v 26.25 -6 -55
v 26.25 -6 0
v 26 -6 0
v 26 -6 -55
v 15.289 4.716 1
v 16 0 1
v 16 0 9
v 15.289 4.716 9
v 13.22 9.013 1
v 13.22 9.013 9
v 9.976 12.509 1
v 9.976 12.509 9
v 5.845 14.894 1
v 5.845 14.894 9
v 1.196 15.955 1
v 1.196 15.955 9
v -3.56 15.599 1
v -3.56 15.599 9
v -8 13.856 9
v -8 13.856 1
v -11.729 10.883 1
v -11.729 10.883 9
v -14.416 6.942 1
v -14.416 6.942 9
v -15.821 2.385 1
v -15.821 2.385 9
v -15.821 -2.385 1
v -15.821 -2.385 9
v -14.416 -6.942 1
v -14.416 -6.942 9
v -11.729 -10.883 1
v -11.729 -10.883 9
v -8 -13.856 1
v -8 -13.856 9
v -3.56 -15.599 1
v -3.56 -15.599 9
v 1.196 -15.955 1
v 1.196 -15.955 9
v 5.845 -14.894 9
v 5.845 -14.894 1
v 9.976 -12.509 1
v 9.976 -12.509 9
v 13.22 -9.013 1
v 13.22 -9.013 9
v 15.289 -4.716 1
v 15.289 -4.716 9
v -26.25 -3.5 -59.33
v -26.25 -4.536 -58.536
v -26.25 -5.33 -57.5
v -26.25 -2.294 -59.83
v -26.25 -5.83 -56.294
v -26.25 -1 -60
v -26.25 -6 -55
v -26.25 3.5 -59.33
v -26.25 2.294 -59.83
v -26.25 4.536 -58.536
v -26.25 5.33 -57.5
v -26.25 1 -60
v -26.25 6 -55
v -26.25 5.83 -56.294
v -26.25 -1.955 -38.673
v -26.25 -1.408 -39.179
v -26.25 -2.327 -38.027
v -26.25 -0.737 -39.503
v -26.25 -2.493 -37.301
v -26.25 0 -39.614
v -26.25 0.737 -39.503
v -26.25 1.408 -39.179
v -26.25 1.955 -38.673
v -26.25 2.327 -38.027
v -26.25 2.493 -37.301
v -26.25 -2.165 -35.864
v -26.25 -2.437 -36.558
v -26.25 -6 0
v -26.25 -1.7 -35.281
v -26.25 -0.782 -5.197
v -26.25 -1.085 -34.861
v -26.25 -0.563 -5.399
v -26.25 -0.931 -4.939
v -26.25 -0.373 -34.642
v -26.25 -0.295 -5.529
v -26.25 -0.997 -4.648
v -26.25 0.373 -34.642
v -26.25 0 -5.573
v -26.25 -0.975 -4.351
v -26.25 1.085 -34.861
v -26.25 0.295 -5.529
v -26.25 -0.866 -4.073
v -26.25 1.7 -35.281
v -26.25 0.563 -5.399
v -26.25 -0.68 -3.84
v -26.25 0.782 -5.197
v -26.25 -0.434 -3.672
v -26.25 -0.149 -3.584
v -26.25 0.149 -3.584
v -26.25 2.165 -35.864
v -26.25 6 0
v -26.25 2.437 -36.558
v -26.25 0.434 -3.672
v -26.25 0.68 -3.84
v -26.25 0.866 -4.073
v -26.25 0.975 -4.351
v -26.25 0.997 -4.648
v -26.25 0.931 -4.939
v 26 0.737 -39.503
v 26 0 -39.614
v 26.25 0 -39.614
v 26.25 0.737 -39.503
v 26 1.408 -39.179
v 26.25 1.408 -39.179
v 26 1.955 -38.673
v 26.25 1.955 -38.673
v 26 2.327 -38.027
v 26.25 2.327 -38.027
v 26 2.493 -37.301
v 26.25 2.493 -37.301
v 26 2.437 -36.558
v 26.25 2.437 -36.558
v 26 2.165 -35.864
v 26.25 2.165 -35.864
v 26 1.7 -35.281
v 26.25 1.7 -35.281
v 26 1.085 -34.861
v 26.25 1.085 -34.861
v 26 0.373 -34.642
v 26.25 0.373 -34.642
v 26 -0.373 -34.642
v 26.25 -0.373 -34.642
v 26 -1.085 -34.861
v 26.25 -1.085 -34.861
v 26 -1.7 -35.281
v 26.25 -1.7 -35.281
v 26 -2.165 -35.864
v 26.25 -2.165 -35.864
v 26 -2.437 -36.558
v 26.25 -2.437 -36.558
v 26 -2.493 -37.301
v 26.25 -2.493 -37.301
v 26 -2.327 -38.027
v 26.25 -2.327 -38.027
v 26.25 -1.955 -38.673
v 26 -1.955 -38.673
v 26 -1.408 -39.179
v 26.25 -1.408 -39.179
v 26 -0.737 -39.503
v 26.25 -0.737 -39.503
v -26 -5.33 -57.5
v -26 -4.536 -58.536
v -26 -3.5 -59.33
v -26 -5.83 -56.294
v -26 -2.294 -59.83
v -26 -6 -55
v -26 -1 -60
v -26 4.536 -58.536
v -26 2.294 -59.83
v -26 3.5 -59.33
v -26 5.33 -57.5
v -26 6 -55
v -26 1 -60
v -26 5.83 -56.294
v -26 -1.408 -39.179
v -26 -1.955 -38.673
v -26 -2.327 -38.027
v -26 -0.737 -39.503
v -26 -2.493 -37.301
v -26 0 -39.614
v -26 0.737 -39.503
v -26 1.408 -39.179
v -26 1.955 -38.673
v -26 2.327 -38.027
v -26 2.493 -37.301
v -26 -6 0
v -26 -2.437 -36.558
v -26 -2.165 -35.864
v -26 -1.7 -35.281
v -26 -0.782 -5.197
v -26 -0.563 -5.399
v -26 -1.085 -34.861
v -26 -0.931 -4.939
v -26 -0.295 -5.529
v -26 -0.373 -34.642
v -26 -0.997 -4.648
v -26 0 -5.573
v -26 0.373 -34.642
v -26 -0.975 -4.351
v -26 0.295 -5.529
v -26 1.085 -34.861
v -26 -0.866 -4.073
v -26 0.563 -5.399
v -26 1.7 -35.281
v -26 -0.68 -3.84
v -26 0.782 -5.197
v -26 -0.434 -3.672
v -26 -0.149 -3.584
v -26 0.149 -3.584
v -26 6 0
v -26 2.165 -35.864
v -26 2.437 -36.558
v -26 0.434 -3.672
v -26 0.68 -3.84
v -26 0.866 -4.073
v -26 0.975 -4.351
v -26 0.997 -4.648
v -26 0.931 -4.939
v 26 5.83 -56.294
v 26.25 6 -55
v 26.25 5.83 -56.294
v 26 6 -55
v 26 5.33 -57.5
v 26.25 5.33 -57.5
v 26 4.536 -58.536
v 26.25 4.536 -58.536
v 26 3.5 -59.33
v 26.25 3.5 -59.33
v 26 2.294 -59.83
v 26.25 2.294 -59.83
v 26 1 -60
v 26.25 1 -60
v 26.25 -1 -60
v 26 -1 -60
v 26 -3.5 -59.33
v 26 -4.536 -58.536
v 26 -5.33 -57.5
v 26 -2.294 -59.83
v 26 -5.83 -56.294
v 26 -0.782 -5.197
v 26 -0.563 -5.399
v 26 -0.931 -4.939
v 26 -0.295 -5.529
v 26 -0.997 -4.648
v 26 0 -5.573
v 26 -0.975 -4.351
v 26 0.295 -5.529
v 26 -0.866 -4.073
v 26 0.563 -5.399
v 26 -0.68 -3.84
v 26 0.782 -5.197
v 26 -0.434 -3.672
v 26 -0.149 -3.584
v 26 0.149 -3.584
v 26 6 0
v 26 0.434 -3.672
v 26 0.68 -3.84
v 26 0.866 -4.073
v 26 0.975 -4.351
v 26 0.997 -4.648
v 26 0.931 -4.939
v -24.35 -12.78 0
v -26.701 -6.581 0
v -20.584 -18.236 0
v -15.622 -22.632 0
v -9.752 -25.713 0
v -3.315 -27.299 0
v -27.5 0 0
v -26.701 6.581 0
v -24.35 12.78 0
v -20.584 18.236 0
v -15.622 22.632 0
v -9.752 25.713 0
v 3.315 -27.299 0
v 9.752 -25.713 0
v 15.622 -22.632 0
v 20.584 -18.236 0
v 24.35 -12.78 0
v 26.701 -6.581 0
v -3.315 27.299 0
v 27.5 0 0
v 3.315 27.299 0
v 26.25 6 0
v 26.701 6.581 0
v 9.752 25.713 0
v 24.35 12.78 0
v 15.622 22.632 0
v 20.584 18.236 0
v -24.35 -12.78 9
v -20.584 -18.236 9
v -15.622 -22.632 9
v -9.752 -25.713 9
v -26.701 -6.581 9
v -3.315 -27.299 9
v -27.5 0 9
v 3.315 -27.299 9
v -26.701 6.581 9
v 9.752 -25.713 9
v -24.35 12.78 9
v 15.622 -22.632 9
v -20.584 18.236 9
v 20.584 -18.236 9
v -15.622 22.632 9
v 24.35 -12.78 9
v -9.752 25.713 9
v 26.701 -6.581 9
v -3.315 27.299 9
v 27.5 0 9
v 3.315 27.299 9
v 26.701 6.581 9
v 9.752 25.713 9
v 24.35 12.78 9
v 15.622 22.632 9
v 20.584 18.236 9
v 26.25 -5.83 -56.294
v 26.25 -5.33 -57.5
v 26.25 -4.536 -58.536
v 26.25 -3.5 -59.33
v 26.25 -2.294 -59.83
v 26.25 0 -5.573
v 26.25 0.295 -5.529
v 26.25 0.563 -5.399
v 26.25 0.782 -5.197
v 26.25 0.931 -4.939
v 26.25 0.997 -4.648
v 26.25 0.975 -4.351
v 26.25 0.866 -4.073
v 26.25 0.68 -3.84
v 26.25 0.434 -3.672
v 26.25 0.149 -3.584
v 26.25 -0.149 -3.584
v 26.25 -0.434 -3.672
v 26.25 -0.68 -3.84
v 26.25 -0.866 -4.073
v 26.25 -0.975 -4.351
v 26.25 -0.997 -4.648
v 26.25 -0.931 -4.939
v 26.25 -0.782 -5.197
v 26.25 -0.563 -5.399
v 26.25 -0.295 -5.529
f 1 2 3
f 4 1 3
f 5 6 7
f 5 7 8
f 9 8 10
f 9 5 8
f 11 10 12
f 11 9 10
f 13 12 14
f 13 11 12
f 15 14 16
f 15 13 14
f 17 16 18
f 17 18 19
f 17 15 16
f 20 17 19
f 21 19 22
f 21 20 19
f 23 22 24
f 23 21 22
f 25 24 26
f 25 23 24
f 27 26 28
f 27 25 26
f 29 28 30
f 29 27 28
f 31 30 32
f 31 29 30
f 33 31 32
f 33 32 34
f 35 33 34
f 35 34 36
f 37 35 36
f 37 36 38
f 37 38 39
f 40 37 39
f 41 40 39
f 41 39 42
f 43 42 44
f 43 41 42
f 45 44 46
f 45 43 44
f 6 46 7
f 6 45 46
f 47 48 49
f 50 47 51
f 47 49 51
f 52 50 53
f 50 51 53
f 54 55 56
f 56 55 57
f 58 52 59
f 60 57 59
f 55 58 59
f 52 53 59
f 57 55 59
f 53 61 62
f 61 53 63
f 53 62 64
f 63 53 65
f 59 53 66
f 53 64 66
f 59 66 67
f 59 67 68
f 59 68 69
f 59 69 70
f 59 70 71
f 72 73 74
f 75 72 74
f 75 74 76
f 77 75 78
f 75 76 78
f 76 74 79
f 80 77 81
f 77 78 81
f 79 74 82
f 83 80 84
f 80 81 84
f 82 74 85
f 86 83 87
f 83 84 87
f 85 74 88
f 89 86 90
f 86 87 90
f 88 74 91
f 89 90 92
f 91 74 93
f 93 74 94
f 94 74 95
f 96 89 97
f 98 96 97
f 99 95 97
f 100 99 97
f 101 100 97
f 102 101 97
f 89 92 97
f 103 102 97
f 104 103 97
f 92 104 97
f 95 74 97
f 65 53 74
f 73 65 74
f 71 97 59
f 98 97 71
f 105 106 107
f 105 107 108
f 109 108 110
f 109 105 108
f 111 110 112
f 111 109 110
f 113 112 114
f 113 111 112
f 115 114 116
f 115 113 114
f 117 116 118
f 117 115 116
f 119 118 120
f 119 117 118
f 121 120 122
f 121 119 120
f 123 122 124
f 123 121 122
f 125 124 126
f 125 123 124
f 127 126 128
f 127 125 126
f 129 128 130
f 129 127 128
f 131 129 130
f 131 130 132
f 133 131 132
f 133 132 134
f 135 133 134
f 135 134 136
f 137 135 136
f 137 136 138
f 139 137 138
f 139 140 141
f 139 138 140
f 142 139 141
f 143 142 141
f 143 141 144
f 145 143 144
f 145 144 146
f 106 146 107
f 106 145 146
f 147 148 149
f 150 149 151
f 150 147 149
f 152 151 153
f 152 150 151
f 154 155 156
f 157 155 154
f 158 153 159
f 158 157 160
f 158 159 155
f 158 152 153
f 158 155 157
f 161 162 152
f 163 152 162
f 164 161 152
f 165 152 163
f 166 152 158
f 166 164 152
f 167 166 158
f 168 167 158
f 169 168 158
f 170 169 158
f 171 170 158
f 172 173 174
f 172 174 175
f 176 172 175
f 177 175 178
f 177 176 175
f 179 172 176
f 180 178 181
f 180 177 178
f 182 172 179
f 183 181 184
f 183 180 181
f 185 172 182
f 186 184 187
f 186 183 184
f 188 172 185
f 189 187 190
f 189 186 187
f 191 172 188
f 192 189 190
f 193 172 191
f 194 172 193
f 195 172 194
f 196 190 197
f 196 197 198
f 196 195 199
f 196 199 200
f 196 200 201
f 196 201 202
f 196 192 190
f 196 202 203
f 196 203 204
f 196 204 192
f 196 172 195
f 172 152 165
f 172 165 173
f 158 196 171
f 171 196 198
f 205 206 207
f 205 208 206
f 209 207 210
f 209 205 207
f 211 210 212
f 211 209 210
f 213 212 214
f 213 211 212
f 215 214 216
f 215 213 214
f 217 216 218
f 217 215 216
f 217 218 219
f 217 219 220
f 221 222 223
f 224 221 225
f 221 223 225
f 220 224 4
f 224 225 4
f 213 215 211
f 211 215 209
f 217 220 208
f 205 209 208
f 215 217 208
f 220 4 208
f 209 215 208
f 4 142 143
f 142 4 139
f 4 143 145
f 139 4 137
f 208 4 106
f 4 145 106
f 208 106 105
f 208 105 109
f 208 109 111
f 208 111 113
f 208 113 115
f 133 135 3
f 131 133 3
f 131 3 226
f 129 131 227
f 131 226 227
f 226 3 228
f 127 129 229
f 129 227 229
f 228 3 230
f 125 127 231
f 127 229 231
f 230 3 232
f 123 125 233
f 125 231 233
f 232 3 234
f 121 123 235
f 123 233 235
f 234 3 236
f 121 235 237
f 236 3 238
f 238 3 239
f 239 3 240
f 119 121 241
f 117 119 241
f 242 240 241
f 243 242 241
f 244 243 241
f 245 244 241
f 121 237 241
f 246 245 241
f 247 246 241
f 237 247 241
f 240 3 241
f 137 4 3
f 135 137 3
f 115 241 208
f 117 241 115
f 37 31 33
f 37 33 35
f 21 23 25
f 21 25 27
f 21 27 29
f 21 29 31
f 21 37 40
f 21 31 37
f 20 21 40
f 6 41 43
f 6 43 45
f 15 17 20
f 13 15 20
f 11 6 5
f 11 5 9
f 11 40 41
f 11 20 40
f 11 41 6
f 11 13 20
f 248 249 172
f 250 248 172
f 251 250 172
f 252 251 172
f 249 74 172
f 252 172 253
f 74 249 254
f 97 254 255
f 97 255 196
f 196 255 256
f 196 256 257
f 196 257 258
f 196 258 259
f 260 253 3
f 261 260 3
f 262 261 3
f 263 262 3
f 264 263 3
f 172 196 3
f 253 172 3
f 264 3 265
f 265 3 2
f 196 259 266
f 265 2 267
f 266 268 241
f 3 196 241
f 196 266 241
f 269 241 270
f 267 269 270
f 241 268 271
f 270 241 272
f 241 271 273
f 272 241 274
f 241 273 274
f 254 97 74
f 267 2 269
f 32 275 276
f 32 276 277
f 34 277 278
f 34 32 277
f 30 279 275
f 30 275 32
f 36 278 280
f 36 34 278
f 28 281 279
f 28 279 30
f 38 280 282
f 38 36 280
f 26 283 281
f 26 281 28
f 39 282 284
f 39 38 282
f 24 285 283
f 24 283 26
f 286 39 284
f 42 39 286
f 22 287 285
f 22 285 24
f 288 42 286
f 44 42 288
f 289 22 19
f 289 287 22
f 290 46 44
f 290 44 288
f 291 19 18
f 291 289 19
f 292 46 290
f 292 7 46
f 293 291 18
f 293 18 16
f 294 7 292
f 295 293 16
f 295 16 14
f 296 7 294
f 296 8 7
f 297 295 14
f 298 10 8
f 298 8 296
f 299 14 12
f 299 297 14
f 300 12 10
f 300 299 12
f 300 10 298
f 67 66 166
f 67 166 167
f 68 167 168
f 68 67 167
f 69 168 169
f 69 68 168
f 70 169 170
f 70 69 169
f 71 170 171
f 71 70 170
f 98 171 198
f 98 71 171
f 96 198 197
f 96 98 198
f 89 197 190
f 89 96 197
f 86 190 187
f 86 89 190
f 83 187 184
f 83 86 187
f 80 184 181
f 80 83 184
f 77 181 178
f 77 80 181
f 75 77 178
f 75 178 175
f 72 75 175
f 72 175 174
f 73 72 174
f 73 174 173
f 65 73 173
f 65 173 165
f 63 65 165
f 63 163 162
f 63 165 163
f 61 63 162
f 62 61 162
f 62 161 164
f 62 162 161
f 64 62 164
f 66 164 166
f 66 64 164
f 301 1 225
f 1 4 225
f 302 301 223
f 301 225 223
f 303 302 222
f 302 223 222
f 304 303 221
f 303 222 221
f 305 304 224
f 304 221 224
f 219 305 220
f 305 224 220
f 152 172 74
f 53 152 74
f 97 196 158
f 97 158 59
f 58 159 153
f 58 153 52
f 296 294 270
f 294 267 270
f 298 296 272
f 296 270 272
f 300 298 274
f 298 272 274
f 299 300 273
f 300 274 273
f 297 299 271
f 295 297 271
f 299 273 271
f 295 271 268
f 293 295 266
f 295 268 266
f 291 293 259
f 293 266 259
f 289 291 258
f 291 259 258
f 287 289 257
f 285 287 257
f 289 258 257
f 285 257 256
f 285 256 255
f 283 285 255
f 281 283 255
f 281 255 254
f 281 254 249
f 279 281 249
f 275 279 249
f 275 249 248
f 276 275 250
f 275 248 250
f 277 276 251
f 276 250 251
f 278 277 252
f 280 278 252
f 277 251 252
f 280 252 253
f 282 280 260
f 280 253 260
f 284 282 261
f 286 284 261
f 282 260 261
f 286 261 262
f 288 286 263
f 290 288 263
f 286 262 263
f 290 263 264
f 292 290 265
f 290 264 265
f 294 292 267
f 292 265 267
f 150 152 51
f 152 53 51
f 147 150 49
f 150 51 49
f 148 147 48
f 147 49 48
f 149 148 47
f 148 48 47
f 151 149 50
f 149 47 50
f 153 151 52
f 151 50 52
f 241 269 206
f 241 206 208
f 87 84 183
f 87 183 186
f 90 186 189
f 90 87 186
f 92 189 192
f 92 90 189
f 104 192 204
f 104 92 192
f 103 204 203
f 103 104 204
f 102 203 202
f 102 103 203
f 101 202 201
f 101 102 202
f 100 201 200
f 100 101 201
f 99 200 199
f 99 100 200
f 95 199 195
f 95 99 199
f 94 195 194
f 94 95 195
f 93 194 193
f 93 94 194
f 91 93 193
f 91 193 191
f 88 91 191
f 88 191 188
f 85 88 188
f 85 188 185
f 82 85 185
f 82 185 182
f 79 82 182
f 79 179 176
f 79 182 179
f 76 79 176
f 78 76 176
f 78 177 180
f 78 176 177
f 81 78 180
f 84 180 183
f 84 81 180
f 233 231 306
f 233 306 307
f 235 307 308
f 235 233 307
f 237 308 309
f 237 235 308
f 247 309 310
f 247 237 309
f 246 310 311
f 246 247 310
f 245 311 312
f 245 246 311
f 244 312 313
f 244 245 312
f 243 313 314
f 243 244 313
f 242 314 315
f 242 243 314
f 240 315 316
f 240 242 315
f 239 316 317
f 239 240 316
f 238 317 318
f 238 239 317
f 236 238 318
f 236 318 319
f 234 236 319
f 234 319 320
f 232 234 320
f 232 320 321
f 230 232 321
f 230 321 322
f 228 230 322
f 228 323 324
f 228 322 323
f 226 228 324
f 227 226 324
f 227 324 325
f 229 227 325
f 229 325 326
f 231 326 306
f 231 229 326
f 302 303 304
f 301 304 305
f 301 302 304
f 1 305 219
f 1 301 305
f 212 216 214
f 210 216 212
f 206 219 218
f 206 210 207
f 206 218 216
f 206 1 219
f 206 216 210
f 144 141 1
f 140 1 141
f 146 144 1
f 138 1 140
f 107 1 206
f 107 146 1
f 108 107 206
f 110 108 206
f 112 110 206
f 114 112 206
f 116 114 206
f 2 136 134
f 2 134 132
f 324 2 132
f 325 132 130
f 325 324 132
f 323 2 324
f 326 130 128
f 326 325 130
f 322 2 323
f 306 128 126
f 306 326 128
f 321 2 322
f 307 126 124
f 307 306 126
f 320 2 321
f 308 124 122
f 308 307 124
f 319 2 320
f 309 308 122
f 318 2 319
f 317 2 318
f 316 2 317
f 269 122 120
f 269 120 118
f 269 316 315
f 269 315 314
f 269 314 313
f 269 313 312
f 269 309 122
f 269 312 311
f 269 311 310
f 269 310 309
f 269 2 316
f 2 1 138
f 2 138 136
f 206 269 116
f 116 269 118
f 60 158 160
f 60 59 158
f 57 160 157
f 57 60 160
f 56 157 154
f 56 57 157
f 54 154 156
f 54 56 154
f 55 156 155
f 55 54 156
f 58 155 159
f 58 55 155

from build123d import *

# Parameters (mm, degrees)
SKETCH1_R               = 27.5
BOSS_EXTRUDE1_DEPTH     = 1
SKETCH2_R               = 27.5
SKETCH2_R_2             = 16
BOSS_EXTRUDE2_DEPTH     = 8
SKETCH3_W               = 0.250349807
SKETCH3_H               = 12
BOSS_EXTRUDE3_DEPTH     = 60
CUT_EXTRUDE1_DEPTH      = 72.50174823
CUT_EXTRUDE1_DEPTH_BACK = 72.50174823
SKETCH4_R               = 2.5
SKETCH4_R_2             = 1
FILLET1_R               = 5


with BuildPart() as part:
    # Sketch1 → Boss-Extrude1 (new body)
    with BuildSketch(Plane.XY):
        Circle(SKETCH1_R)
    extrude(amount=BOSS_EXTRUDE1_DEPTH)

    # Sketch2 → Boss-Extrude2 (add)
    with BuildSketch(Plane.XY.offset(1)):
        Circle(SKETCH2_R)
        Circle(SKETCH2_R_2, mode=Mode.SUBTRACT)
    extrude(amount=BOSS_EXTRUDE2_DEPTH)

    # Sketch3 → Boss-Extrude3 (add)
    with BuildSketch(Plane(origin=(0, 0, 0), x_dir=(-1, 0, 0), z_dir=(0, 0, -1))):
        with Locations((-26.125174904, 0)):
            Rectangle(SKETCH3_W, SKETCH3_H)
        with Locations((26.125174904, 0)):
            Rectangle(SKETCH3_W, SKETCH3_H)
    extrude(amount=BOSS_EXTRUDE3_DEPTH)

    # Sketch4 → Cut-Extrude1 (cut, two sides: drawn at the far end of the back side and taken through both)
    with BuildSketch(Plane(origin=(0, 0, 0), x_dir=(0, 0, -1), z_dir=(1, 0, 0)).offset(-CUT_EXTRUDE1_DEPTH_BACK)):
        with Locations((37.113852525, 0)):
            Circle(SKETCH4_R)
        with Locations((4.573176496, 0)):
            Circle(SKETCH4_R_2)
    extrude(amount=CUT_EXTRUDE1_DEPTH + CUT_EXTRUDE1_DEPTH_BACK, mode=Mode.SUBTRACT)

    # Fillet1
    fillet1_edges = [part.edges().sort_by_distance(p)[0] for p in [
        (-26.125174903, -6, -60),
        (-26.125174903, 6, -60),
        (26.125174903, -6, -60),
        (26.125174903, 6, -60),
    ]]
    fillet(fillet1_edges, radius=FILLET1_R)


solid = part.part
